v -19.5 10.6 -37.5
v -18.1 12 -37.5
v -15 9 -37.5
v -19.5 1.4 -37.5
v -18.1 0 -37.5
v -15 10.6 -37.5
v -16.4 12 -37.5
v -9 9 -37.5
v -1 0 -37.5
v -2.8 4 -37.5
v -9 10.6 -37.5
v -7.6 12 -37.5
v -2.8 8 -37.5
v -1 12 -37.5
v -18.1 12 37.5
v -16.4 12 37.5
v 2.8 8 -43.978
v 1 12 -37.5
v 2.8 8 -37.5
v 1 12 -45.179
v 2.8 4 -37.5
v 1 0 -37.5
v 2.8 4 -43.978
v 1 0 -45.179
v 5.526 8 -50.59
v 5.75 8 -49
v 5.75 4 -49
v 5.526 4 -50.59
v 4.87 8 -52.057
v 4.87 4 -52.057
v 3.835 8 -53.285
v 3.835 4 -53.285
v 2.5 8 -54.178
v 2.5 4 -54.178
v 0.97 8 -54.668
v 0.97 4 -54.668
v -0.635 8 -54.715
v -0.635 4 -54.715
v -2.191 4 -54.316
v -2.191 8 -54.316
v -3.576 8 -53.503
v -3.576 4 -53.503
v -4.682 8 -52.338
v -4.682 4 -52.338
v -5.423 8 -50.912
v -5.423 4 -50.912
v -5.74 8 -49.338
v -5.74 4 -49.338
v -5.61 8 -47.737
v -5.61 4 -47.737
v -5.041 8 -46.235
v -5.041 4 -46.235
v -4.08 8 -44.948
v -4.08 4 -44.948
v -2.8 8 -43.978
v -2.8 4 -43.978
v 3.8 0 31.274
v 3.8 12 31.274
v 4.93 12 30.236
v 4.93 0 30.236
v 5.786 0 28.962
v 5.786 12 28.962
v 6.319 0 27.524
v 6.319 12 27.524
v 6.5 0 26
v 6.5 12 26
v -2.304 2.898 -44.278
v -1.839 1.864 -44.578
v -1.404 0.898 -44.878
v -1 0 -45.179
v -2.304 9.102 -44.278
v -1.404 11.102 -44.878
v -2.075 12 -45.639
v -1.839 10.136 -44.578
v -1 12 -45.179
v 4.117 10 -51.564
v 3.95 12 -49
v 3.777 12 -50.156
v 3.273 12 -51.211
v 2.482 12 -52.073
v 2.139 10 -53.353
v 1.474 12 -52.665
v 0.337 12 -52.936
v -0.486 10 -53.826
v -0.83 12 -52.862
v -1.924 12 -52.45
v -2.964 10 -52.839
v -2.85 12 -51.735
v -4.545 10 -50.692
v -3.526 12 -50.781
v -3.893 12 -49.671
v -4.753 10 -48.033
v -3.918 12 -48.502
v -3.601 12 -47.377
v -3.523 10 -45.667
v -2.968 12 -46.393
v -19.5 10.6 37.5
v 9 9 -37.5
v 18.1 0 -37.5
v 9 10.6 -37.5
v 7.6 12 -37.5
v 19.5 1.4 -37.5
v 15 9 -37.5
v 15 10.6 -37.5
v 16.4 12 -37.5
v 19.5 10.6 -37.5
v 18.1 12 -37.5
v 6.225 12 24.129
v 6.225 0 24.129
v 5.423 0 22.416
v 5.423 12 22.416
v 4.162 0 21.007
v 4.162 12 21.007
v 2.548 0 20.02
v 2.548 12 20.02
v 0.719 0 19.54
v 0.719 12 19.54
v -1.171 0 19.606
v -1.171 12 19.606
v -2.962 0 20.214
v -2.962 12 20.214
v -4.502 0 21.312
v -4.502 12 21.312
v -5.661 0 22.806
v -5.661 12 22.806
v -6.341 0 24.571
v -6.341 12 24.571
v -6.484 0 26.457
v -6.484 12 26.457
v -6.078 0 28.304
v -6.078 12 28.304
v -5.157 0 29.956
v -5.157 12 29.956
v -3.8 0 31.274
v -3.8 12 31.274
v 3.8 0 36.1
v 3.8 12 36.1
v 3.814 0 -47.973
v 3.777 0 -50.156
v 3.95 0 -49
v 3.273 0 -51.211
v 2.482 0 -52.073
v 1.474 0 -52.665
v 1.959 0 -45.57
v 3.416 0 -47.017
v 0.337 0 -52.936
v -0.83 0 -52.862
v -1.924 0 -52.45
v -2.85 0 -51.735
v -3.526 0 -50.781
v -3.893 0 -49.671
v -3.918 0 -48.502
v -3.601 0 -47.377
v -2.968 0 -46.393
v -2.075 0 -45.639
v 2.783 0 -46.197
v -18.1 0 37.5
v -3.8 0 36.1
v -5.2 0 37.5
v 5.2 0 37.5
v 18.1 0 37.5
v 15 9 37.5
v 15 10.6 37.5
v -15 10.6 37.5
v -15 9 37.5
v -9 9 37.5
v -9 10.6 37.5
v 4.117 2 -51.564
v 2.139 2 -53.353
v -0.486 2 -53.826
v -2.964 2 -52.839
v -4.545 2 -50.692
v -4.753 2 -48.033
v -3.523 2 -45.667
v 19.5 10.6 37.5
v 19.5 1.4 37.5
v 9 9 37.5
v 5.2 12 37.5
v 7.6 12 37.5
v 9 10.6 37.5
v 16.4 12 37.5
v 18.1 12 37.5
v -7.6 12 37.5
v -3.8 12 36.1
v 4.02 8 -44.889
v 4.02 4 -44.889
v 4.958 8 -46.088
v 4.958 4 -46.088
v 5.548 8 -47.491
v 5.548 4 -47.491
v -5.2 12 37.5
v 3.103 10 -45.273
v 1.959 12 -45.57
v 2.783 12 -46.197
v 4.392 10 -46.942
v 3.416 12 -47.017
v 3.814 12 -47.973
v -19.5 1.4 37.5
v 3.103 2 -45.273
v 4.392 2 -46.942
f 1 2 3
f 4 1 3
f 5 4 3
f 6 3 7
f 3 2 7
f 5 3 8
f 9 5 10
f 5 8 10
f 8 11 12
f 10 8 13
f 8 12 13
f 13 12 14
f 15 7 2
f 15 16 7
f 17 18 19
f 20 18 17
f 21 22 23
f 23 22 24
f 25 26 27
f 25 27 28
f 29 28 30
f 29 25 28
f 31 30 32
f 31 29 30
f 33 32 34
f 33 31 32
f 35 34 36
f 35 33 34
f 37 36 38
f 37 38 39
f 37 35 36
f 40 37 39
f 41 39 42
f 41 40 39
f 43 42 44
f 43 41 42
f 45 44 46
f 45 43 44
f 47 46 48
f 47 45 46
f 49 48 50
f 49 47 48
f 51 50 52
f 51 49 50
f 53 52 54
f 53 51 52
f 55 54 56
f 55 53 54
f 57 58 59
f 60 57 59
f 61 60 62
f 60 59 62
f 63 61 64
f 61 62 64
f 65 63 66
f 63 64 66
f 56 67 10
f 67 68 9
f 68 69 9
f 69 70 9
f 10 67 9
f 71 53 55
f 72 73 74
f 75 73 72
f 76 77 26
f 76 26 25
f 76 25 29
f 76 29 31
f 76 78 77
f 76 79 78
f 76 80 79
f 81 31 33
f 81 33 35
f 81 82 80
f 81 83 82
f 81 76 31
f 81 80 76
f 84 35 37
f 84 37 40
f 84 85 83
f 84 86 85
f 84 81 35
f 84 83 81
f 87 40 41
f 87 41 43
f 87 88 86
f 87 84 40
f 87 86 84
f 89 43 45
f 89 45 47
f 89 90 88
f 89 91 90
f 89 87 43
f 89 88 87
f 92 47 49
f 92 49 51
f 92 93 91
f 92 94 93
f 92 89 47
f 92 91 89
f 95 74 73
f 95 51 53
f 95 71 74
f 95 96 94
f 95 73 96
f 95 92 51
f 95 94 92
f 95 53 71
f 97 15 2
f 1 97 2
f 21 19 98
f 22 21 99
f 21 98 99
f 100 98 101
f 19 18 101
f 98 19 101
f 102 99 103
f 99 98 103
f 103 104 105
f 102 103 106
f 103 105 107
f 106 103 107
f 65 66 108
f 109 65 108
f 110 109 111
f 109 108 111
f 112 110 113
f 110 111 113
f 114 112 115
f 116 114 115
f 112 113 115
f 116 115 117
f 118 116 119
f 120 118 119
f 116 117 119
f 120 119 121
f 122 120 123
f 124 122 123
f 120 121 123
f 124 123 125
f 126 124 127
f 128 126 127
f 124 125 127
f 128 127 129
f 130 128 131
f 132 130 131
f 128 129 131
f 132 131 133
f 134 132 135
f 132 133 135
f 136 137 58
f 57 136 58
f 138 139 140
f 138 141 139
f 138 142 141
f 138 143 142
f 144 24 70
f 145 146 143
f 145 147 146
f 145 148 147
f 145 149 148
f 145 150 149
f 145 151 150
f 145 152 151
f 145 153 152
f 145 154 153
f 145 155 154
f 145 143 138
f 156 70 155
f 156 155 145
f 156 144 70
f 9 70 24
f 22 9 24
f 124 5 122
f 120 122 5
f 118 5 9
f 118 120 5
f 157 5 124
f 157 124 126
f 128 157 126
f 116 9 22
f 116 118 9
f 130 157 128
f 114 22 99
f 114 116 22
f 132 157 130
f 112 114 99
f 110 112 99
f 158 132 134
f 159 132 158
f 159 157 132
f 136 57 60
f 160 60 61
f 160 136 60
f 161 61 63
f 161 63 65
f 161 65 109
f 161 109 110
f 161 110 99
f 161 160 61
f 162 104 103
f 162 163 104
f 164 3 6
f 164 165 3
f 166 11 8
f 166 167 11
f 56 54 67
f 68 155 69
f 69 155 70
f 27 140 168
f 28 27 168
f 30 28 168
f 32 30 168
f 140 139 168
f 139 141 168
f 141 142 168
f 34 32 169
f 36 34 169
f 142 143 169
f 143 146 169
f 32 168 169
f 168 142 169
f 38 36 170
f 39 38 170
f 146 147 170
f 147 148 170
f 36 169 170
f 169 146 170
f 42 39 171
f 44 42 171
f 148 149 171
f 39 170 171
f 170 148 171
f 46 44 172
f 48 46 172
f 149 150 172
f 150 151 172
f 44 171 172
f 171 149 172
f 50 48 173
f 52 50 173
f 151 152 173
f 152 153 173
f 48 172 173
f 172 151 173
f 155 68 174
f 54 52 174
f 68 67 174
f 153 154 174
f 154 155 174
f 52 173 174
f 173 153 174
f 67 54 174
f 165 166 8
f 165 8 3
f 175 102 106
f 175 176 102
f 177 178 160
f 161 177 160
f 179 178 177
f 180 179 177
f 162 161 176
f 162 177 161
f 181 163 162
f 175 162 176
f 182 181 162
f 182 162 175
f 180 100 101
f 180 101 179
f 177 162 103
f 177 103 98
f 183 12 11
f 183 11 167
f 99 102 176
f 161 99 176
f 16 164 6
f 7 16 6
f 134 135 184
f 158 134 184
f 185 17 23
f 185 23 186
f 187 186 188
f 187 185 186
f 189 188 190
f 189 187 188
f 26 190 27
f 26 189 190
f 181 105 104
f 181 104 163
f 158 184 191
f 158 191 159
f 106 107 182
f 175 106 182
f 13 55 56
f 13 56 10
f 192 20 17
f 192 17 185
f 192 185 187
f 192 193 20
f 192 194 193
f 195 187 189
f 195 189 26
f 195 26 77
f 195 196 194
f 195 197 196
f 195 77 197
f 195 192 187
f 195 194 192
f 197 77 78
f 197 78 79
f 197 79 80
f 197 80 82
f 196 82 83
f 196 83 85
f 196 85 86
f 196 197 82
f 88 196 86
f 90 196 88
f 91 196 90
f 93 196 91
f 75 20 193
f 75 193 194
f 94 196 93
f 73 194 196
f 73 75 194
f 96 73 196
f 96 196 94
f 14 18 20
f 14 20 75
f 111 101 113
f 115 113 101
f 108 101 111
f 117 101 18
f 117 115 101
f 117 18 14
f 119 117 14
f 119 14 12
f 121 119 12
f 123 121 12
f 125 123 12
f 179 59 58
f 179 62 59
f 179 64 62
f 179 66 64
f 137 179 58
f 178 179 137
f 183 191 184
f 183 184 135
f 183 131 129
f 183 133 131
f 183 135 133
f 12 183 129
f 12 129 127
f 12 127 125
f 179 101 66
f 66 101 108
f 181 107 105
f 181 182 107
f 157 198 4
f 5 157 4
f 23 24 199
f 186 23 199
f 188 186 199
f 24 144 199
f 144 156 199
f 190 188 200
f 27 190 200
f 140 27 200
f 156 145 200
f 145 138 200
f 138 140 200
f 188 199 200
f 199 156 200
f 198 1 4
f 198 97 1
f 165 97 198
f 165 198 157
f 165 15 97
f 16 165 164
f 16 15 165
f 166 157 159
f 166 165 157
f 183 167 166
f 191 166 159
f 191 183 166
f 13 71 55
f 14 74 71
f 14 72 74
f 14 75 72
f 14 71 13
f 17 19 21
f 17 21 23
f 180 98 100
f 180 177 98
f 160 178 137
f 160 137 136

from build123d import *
from OCP.BRepFilletAPI import BRepFilletAPI_MakeChamfer

# Parameters (mm, degrees)
BOSS_EXTRUDE1_DEPTH = 37.5
CUT_EXTRUDE1_DEPTH  = 44.937455548
CHAMFER1_SIZE       = 1.4
BOSS_EXTRUDE2_DEPTH = 12
CHAMFER2_SIZE       = 4
CHAMFER2_SIZE2      = 1.8


with BuildPart() as part:
    # Sketch2 → Boss-Extrude1 (new, symmetric)
    with BuildSketch(Plane.XY):
        Polygon((-19.5, 0), (19.5, 0), (19.5, 12), (15, 12), (15, 9), (9, 9), (9, 12), (-9, 12), (-9, 9), (-15, 9), (-15, 12), (-19.5, 12), align=None)
    extrude(amount=BOSS_EXTRUDE1_DEPTH, both=True)

    # Sketch3 → Cut-Extrude1 (cut, through all)
    with BuildSketch(Plane(origin=(0, 12, 0), x_dir=(1, 0, 0), z_dir=(0, 1, 0))):
        with BuildLine():
            ThreePointArc((-3.8, -31.273518749), (0, -32.5), (3.8, -31.273518749))
            Line((3.8, -31.273518749), (3.8, -26))
            Line((3.8, -26), (-3.8, -26))
            Line((-3.8, -26), (-3.8, -31.273518749))
        make_face()
        with BuildLine():
            Line((3.8, -26), (3.8, -31.273518749))
            ThreePointArc((3.8, -31.273518749), (5.785758377, -28.962262649), (6.5, -26))
            ThreePointArc((6.5, -26), (-2.962262649, -20.214241623), (-3.8, -31.273518749))
            Line((-3.8, -31.273518749), (-3.8, -26))
            Line((-3.8, -26), (3.8, -26))
        make_face()
        with BuildLine():
            Line((-3.8, -37.5), (3.8, -37.5))
            Line((3.8, -37.5), (3.8, -31.273518749))
            ThreePointArc((3.8, -31.273518749), (0, -32.5), (-3.8, -31.273518749))
            Line((-3.8, -31.273518749), (-3.8, -37.5))
        make_face()
    extrude(amount=-CUT_EXTRUDE1_DEPTH, mode=Mode.SUBTRACT)

    # Chamfer1
    chamfer1_edges = [part.edges().sort_by_distance(p)[0] for p in [
        (-19.5, 12, 0),
        (-15, 12, 0),
        (-9, 12, 0),
        (9, 12, 0),
        (15, 12, 0),
        (19.5, 12, 0),
        (19.5, 0, 0),
        (-19.5, 0, 0),
        (3.8, 6, 37.5),
        (-3.8, 6, 37.5),
    ]]
    chamfer(chamfer1_edges, length=CHAMFER1_SIZE)

    # Sketch4 → Boss-Extrude2 (add)
    with BuildSketch(Plane(origin=(0, 12, 0), x_dir=(1, 0, 0), z_dir=(0, 1, 0))):
        with BuildLine():
            Line((-2.8, 43.977799287), (-2.8, 49))
            Line((-2.8, 49), (2.8, 49))
            Line((2.8, 49), (2.8, 43.977799287))
            ThreePointArc((2.8, 43.977799287), (4.957948164, 46.087741426), (5.75, 49))
            ThreePointArc((5.75, 49), (-2.912258574, 53.957948164), (-2.8, 43.977799287))
        make_face()
        with BuildLine():
            Line((2.8, 49), (-2.8, 49))
            Line((-2.8, 49), (-2.8, 43.977799287))
            ThreePointArc((-2.8, 43.977799287), (0, 43.25), (2.8, 43.977799287))
            Line((2.8, 43.977799287), (2.8, 49))
        make_face()
        with BuildLine():
            ThreePointArc((2.8, 43.977799287), (0, 43.25), (-2.8, 43.977799287))
            Line((-2.8, 43.977799287), (-2.8, 37.5))
            Line((-2.8, 37.5), (2.8, 37.5))
            Line((2.8, 37.5), (2.8, 43.977799287))
        make_face()
    extrude(amount=-BOSS_EXTRUDE2_DEPTH)

    # Chamfer2: one chamfer whose edges measure the first distance from different faces: ONE call of the kernel's chamfer builder (chamfer() names one face for all edges)
    chamfer2_edges_1 = [part.edges().sort_by_distance(p)[0] for p in [
        (2.8, 0, -40.738899644),
        (2.8, 12, -40.738899644),
    ]]
    chamfer2_side_1 = [part.faces().sort_by_distance(p)[0] for p in [
        (2.8, 6, -40.738899644),
    ]]
    chamfer2_edges_2 = [part.edges().sort_by_distance(p)[0] for p in [
        (0, 12, -54.75),
        (0, 0, -54.75),
    ]]
    chamfer2_side_2 = [part.faces().sort_by_distance(p)[0] for p in [
        (0, 6, -54.75),
    ]]
    chamfer2_edges_3 = [part.edges().sort_by_distance(p)[0] for p in [
        (-2.8, 12, -40.738899644),
        (-2.8, 0, -40.738899644),
    ]]
    chamfer2_side_3 = [part.faces().sort_by_distance(p)[0] for p in [
        (-2.8, 6, -40.738899644),
    ]]
    chamfer2 = BRepFilletAPI_MakeChamfer(part.part.solid().wrapped)
    for e in chamfer2_edges_1:
        chamfer2.Add(CHAMFER2_SIZE, CHAMFER2_SIZE2, e.wrapped, chamfer2_side_1[0].wrapped)  # the first distance lies on this face
    for e in chamfer2_edges_2:
        chamfer2.Add(CHAMFER2_SIZE, CHAMFER2_SIZE2, e.wrapped, chamfer2_side_2[0].wrapped)  # the first distance lies on this face
    for e in chamfer2_edges_3:
        chamfer2.Add(CHAMFER2_SIZE, CHAMFER2_SIZE2, e.wrapped, chamfer2_side_3[0].wrapped)  # the first distance lies on this face
    add(Compound.cast(chamfer2.Shape()), mode=Mode.REPLACE)


solid = part.part
